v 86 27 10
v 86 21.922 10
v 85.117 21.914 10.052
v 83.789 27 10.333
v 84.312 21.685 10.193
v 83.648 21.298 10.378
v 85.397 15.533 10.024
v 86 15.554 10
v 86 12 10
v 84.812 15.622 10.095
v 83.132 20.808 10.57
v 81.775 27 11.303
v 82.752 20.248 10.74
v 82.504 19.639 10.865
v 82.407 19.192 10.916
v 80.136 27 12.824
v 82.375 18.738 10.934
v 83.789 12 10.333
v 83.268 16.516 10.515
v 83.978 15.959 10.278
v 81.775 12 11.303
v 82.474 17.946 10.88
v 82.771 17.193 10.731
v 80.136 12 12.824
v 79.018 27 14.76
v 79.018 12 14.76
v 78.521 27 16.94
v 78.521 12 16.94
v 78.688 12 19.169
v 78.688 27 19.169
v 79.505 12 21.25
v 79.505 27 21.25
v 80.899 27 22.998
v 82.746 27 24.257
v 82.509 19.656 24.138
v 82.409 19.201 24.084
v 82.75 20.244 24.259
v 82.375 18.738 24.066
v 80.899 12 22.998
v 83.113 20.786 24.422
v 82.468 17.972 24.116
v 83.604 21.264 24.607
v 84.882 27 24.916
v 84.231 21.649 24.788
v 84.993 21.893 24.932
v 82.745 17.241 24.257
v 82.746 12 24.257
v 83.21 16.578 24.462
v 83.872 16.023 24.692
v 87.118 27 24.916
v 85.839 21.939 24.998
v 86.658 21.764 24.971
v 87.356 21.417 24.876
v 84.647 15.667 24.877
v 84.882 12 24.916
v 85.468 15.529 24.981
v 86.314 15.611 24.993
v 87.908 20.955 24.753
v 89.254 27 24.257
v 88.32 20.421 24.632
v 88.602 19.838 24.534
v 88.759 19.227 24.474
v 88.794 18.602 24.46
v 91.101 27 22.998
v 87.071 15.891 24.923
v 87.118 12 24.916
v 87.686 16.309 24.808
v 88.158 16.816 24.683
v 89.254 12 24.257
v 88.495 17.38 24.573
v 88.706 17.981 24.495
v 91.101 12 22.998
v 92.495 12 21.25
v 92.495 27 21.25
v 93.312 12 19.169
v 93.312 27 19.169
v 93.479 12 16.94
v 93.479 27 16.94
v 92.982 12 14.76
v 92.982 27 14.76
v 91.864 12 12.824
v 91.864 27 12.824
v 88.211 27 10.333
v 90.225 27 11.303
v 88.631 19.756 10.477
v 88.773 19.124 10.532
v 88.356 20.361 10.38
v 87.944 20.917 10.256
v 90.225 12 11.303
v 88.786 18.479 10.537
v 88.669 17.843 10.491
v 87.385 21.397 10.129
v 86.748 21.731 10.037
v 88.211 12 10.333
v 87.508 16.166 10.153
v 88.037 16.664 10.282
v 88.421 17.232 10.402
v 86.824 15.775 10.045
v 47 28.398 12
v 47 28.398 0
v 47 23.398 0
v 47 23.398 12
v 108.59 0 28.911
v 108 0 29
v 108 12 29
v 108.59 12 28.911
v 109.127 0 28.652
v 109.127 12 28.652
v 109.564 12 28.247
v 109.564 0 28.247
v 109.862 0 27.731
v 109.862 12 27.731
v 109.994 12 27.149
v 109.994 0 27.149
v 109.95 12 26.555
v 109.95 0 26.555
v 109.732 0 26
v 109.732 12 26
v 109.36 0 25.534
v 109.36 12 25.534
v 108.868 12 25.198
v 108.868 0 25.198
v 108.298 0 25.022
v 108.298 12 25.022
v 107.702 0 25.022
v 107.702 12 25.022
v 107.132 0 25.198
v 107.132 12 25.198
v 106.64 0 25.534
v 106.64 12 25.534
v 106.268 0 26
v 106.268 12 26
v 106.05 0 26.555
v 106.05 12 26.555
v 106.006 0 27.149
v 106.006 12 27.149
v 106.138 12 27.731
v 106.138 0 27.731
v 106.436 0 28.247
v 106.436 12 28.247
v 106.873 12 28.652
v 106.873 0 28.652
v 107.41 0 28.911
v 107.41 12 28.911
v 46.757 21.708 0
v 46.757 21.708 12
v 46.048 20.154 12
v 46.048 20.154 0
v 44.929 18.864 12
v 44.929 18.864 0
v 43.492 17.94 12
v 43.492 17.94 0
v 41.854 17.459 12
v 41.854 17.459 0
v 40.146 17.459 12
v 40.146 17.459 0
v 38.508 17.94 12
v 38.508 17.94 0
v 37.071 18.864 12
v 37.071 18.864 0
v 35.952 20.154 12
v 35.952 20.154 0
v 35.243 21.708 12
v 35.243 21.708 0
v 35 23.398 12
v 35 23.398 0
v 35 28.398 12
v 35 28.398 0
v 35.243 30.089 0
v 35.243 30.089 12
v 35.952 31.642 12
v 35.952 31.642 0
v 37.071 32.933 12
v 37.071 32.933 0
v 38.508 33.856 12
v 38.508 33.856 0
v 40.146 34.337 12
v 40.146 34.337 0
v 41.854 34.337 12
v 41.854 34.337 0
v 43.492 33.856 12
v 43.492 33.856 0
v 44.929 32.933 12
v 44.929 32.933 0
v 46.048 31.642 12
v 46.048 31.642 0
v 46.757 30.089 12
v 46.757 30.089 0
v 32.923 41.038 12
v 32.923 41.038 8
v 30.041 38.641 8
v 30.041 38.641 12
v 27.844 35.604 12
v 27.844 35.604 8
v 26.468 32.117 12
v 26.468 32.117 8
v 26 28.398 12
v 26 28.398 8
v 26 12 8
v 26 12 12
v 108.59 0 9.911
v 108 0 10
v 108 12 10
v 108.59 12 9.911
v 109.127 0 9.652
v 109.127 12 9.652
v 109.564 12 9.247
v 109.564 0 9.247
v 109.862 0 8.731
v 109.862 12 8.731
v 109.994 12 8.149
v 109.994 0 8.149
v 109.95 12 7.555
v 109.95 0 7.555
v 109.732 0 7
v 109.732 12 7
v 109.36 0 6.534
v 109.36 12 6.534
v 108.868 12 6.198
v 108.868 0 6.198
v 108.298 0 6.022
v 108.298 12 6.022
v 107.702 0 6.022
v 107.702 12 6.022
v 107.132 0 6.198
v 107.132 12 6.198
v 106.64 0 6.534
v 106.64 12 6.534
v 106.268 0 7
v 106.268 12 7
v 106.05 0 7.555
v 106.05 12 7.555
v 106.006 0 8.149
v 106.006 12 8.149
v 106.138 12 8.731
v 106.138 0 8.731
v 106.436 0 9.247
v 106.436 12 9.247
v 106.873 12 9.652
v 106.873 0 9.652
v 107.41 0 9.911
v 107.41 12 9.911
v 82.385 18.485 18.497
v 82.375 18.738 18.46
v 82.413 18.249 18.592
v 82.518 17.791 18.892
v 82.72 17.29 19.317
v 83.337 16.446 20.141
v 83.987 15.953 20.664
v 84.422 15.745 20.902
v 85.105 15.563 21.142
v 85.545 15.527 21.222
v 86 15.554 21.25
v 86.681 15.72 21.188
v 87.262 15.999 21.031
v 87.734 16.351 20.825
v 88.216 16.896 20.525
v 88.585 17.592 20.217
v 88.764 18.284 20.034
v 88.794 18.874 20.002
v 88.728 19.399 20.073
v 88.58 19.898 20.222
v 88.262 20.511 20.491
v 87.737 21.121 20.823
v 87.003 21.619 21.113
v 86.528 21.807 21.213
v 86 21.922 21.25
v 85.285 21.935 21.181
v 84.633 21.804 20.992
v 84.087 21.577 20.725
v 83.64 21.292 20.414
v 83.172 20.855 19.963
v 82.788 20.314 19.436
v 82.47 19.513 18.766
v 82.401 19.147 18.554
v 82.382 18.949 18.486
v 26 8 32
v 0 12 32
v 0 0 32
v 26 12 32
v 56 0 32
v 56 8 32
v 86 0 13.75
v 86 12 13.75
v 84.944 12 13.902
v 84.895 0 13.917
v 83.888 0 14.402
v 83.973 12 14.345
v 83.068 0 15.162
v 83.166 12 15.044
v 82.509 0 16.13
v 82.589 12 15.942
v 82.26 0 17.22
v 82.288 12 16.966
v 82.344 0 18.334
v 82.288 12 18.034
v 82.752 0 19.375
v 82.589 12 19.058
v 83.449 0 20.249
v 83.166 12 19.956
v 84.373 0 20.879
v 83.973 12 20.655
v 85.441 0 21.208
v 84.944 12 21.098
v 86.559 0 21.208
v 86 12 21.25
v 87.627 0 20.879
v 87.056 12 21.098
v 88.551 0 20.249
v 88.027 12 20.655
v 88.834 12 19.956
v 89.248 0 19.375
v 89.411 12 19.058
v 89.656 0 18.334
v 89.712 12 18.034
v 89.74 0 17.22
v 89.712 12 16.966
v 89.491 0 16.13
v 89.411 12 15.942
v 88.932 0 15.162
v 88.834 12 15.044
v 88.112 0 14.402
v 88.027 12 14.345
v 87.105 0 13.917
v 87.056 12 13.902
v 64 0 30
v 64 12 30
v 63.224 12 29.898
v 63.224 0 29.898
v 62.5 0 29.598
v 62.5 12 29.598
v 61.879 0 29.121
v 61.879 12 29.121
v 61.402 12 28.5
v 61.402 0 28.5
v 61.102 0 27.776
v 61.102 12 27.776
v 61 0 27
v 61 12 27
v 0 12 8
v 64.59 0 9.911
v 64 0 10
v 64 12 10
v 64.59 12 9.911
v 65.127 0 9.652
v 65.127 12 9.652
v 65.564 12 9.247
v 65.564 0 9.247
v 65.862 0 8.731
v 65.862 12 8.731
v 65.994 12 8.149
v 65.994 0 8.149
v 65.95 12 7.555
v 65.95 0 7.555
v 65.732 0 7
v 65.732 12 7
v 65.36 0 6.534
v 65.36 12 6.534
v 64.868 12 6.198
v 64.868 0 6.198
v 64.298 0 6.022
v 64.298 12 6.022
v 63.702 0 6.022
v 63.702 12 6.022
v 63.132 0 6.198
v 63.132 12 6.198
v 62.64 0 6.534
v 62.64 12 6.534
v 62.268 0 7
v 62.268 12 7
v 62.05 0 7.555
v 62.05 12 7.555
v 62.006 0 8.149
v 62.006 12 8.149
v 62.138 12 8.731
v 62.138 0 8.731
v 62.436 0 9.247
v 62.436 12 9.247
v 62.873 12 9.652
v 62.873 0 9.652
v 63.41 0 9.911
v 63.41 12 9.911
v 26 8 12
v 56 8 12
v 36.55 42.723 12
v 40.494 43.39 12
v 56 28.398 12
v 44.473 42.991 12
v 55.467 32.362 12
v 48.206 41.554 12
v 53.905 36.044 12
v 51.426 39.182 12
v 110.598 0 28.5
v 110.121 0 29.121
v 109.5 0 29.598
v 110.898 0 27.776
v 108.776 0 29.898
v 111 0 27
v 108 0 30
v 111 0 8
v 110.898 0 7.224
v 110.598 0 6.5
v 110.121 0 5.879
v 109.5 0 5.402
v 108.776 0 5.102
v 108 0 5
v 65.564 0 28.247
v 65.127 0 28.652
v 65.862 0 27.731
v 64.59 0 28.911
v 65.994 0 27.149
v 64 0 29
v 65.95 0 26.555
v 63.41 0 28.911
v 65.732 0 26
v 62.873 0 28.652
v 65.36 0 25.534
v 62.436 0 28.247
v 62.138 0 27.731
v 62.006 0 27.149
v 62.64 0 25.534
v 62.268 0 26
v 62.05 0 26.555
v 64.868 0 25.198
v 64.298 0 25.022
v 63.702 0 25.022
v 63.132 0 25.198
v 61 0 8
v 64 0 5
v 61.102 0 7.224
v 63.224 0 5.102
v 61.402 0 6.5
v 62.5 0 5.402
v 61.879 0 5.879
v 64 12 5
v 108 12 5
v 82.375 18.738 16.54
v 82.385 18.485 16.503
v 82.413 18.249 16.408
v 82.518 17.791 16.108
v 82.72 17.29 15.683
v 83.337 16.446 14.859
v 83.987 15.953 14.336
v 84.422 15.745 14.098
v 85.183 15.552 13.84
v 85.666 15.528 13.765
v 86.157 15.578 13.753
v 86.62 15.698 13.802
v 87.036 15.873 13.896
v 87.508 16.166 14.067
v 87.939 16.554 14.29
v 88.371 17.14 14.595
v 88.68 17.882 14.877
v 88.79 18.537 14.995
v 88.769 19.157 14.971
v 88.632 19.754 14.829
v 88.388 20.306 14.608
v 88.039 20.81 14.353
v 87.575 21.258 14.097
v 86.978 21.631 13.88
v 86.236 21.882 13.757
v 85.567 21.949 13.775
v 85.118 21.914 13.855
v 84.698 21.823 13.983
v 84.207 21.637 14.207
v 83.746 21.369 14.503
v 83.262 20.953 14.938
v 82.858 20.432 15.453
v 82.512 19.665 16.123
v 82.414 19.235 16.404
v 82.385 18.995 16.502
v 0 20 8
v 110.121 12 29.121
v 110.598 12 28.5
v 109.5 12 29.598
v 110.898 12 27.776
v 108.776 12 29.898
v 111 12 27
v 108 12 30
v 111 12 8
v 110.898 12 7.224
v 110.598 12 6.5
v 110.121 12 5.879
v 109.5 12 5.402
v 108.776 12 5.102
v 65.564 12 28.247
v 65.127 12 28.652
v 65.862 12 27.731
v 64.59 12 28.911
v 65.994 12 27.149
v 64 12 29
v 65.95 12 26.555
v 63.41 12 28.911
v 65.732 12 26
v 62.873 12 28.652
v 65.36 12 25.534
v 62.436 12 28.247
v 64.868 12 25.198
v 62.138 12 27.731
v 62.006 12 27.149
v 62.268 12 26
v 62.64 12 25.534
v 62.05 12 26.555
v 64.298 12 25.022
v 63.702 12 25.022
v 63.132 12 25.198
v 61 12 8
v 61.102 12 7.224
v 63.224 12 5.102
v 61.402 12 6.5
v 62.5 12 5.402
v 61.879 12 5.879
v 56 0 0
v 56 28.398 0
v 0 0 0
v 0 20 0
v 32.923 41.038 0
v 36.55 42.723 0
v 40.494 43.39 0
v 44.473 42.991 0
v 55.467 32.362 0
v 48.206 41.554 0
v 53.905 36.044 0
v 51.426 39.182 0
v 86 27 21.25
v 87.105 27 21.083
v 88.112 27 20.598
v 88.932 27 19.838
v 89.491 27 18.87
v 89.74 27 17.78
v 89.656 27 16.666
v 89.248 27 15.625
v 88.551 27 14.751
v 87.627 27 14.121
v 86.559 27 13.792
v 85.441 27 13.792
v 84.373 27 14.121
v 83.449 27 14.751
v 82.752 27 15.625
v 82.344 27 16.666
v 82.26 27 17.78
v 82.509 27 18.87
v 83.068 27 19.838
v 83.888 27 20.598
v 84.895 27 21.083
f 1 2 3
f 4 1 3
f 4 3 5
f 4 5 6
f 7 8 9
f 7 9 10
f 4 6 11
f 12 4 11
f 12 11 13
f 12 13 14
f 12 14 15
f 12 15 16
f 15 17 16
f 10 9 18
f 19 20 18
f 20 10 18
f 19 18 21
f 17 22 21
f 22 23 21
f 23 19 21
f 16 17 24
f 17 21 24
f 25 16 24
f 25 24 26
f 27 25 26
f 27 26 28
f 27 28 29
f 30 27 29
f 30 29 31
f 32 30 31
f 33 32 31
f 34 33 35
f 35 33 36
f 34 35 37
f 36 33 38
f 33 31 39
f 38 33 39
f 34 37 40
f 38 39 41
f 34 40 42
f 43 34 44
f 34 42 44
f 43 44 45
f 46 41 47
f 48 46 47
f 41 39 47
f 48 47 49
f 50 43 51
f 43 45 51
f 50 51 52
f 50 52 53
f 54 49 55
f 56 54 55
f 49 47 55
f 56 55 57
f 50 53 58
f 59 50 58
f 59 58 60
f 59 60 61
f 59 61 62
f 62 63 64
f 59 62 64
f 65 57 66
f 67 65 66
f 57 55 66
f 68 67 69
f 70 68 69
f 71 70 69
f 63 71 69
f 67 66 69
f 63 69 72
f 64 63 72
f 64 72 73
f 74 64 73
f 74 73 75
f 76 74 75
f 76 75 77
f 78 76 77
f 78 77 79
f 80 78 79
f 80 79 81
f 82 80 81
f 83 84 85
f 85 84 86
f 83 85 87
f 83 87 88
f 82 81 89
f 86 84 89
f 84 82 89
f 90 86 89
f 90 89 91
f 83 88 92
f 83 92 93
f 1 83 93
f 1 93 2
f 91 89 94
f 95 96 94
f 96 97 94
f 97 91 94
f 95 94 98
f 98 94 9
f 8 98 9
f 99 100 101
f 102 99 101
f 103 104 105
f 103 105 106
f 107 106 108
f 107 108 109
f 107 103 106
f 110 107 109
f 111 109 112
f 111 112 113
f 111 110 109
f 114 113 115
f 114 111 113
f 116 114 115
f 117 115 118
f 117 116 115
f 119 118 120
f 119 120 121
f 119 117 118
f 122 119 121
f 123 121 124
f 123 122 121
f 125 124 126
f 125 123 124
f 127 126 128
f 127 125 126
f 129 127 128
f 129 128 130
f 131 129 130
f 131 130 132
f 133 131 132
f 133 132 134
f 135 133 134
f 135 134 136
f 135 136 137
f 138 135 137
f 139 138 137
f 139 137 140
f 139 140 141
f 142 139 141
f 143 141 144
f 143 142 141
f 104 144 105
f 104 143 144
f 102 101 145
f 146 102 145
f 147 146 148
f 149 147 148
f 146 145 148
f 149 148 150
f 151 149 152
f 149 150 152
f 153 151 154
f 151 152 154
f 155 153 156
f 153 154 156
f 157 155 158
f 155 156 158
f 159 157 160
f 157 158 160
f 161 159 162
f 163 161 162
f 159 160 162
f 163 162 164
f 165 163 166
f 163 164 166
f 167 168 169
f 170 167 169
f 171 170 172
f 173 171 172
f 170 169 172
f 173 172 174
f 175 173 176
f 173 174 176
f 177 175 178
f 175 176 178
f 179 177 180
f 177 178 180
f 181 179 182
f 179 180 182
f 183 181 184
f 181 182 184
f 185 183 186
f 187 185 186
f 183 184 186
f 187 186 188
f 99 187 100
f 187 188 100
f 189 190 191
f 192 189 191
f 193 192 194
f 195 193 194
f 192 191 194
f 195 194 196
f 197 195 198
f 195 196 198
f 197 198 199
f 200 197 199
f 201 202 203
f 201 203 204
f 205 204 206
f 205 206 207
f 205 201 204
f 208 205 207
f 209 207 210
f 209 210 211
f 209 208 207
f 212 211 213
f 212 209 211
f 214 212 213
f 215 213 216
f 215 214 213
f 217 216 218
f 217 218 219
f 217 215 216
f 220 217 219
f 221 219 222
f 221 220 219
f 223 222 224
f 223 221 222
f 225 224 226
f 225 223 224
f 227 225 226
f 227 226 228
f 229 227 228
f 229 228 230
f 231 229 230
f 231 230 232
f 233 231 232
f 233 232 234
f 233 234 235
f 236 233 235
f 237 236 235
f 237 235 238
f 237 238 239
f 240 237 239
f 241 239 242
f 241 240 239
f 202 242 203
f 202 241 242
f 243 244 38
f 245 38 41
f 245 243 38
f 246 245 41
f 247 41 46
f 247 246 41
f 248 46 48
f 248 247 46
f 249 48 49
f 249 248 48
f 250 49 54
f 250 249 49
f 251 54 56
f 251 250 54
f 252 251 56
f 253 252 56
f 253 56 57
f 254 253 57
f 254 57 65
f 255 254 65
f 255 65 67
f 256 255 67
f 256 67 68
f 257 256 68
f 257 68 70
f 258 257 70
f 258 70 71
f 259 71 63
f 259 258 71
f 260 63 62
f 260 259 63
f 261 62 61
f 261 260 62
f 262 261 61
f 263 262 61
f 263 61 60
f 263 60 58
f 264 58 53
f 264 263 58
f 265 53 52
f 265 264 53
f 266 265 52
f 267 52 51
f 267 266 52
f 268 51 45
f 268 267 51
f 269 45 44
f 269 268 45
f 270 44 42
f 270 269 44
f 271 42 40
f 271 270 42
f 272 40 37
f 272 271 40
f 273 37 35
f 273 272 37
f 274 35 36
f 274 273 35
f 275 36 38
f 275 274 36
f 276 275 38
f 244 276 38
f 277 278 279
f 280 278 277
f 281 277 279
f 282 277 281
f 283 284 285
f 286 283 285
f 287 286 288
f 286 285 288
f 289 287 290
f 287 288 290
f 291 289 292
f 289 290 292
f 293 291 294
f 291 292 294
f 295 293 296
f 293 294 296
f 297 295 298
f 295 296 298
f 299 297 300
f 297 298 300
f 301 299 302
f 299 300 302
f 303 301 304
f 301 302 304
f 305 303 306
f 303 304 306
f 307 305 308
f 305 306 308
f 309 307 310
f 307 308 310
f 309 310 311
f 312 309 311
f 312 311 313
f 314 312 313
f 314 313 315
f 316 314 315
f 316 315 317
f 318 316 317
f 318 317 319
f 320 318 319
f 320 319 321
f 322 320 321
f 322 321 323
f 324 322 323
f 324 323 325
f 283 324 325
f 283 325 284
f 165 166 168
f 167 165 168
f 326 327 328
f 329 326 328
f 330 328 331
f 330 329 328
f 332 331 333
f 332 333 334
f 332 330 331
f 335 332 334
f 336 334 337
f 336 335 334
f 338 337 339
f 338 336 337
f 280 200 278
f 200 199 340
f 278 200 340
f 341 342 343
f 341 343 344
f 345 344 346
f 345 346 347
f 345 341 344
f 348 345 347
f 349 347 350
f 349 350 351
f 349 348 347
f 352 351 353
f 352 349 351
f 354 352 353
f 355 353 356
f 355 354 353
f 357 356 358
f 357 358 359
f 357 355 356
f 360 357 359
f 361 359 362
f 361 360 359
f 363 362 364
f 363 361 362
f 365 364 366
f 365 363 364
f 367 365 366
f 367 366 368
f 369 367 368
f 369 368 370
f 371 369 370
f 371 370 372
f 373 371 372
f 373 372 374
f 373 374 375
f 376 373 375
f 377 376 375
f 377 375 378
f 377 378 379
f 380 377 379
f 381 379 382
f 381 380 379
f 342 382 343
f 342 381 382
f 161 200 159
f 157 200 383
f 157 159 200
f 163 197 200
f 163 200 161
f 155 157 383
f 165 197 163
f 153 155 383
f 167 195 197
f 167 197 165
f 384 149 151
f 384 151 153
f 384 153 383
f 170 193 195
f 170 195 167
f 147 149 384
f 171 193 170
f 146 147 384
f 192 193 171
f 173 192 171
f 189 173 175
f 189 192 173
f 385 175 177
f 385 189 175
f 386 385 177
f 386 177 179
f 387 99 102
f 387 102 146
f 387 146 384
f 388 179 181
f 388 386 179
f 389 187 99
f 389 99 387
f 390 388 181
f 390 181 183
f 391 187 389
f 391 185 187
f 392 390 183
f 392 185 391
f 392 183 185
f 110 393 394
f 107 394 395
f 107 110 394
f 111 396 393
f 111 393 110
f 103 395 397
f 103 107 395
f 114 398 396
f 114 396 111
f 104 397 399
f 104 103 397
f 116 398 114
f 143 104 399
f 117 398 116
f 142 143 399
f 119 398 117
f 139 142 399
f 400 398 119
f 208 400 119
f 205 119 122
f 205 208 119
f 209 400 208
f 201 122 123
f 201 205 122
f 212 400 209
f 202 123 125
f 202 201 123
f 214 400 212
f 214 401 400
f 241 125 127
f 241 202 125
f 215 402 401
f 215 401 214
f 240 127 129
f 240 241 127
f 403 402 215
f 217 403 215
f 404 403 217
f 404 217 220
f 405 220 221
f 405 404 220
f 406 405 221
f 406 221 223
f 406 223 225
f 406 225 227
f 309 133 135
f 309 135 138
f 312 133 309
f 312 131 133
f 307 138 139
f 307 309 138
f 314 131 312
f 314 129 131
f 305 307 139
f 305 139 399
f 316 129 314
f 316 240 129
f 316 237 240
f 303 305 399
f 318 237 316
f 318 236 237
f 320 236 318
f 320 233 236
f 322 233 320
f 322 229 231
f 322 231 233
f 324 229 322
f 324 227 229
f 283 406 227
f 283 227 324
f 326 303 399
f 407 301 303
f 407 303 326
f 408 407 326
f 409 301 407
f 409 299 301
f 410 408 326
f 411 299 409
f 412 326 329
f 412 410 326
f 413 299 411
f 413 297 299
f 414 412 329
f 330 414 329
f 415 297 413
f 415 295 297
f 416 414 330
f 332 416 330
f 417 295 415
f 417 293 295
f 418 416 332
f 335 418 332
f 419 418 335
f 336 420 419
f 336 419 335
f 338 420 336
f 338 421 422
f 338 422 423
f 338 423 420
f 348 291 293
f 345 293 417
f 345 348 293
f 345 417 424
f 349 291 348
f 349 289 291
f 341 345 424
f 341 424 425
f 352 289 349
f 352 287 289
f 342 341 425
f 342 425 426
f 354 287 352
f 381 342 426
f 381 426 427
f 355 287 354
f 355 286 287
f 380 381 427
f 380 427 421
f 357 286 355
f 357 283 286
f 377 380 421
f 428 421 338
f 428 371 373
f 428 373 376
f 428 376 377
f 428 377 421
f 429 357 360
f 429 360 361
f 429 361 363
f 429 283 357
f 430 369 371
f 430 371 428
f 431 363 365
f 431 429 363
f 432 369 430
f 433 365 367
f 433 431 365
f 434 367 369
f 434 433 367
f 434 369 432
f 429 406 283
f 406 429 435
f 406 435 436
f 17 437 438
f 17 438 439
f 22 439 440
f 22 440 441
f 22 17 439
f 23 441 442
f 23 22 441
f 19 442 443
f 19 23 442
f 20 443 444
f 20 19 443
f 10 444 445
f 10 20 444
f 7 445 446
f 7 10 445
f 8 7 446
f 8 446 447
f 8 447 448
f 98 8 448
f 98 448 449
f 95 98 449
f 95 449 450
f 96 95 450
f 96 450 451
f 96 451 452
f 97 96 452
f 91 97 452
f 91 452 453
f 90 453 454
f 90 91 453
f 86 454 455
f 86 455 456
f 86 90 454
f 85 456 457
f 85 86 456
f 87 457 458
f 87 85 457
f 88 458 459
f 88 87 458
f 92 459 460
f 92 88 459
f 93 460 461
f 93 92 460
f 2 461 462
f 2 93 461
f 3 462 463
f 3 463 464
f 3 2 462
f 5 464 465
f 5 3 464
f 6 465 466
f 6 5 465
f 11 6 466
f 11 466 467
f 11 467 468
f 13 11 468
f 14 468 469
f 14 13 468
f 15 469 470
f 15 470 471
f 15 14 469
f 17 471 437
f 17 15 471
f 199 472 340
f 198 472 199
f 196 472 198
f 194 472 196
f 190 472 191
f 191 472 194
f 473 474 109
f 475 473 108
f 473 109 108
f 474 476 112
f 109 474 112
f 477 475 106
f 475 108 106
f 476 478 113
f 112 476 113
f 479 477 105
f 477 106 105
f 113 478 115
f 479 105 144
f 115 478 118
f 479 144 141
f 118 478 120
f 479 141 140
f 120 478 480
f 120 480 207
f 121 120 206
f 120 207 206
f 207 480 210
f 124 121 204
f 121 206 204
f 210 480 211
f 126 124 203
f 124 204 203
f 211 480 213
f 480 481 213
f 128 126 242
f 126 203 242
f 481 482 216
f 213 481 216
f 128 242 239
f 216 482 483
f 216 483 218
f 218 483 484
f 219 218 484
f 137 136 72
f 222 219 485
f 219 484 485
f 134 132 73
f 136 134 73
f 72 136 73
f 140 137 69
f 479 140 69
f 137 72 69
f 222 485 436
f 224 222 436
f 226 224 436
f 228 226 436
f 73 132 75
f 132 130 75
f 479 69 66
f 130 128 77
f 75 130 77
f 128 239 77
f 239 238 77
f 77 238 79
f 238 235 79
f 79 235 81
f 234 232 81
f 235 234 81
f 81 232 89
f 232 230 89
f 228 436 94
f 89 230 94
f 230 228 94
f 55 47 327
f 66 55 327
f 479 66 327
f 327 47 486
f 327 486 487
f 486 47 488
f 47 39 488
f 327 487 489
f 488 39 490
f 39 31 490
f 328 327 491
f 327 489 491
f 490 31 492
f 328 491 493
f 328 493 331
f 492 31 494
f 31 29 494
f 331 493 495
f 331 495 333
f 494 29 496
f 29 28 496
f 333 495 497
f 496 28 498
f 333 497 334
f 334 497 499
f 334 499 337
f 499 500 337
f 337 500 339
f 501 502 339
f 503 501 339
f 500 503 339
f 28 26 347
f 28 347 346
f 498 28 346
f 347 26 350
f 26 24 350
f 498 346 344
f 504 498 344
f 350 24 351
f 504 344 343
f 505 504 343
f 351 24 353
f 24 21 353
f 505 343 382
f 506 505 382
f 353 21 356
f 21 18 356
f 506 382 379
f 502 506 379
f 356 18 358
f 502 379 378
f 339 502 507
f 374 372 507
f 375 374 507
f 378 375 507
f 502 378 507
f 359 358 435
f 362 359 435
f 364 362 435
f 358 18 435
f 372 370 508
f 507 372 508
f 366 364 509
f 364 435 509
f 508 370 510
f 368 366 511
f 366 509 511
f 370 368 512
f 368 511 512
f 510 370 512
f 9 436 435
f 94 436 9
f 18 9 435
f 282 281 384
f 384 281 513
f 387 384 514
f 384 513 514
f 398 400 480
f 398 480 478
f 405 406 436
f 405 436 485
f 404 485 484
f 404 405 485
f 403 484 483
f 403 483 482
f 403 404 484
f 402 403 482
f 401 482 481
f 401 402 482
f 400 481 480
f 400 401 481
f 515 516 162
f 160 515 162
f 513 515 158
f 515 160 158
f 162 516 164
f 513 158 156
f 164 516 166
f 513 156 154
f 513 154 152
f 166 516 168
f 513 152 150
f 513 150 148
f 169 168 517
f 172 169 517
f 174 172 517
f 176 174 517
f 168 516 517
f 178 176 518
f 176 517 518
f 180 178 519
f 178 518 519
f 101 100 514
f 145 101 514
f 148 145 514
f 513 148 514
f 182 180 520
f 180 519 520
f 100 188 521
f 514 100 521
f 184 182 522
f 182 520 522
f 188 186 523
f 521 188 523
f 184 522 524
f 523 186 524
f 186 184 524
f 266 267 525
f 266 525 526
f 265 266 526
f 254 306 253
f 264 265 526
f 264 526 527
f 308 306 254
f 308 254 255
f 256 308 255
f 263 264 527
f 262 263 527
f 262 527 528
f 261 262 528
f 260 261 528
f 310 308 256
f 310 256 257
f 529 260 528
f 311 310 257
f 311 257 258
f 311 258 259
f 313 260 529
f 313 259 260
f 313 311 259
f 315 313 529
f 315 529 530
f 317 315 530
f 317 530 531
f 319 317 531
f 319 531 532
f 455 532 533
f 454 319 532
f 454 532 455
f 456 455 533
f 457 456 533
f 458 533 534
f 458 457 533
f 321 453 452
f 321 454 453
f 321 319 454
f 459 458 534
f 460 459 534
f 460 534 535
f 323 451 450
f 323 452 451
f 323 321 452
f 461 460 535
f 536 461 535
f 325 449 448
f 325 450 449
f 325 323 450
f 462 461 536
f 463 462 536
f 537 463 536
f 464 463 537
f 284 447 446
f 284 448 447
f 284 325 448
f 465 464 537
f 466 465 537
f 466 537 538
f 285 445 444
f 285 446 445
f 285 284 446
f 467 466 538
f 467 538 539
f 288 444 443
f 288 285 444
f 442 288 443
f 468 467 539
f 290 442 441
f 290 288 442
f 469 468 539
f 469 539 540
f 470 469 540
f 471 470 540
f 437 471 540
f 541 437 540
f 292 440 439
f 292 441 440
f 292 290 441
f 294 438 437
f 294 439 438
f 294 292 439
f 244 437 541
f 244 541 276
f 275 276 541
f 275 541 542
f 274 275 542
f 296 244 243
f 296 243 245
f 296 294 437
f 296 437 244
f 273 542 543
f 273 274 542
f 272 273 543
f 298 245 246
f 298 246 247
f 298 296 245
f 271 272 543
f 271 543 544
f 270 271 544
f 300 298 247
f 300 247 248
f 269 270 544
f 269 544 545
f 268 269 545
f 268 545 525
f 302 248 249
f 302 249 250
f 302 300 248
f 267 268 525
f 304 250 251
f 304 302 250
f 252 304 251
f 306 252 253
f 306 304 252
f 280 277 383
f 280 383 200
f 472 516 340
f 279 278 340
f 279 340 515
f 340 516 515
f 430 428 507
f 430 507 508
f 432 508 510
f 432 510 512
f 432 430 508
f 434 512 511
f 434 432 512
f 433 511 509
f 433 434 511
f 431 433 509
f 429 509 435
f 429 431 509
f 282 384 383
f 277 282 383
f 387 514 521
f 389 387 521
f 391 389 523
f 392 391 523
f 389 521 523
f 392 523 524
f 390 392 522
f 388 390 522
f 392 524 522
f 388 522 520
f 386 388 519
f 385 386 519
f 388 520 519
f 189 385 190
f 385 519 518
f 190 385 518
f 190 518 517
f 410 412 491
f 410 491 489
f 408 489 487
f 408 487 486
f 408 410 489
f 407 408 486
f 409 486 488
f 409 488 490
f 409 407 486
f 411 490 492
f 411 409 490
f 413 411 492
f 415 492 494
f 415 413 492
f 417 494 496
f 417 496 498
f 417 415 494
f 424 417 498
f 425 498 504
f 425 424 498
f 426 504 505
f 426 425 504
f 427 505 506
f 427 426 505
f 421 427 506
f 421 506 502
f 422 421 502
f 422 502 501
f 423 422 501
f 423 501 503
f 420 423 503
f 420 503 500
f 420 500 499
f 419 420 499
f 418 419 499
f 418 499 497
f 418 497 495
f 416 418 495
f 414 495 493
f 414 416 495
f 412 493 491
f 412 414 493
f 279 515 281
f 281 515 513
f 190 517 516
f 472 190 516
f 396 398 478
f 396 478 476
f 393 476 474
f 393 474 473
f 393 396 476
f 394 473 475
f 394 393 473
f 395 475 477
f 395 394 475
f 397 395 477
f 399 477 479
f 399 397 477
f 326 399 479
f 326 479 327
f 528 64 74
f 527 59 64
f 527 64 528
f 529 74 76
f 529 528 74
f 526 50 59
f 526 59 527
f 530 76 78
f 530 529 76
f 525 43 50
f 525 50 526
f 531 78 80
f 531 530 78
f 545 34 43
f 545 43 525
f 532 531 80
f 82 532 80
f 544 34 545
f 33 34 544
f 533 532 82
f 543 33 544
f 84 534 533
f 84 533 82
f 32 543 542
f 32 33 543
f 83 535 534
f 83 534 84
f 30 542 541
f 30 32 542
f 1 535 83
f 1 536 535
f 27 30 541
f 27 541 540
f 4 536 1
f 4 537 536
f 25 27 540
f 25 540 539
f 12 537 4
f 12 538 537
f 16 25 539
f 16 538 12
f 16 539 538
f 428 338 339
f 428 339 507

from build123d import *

# Parameters (mm, degrees)
EXTRUDE_1_DEPTH          = 32
EXTRUDE_2_DEPTH          = 8
EXTRUDE_3_DEPTH          = 12
SKETCH_2_R               = 2
EXTRUDE_4_DEPTH          = 12
SKETCH_3_R               = 7.5
SKETCH_3_R_2             = 3.75
EXTRUDE_5_DEPTH          = 15
SKETCH_3_5_R             = 3.75
CUT_EXTRUDE_2_DEPTH      = 15
CUT_EXTRUDE_3_DEPTH      = 15
CUT_EXTRUDE_3_DEPTH_BACK = 15
SKETCH_7_R               = 3.210770443


with BuildPart() as part:
    # 草图1 → 凸台-拉伸1 (new body)
    with BuildSketch(Plane.XY):
        Polygon((0, 12), (0, 0), (56, 0), (56, 8), (26, 8), (26, 12), align=None)
    extrude(amount=EXTRUDE_1_DEPTH)

    # 草图1<3> → 凸台-拉伸2 (add)
    with BuildSketch(Plane.XY):
        with BuildLine():
            Line((0, 20), (0, 12))
            Line((0, 12), (26, 12))
            Line((26, 12), (26, 28.398213008))
            ThreePointArc((26, 28.398213008), (27.844145216, 35.604008238), (32.923131319, 41.037999094))
            Line((32.923131319, 41.037999094), (0, 20))
        make_face()
    extrude(amount=EXTRUDE_2_DEPTH)

    # 草图1<4> → 凸台-拉伸3 (add)
    with BuildSketch(Plane.XY):
        with BuildLine():
            Line((26, 8), (56, 8))
            Line((56, 8), (56, 28.398213008))
            ThreePointArc((56, 28.398213008), (48.20579523, 41.554067792), (32.923131319, 41.037999094))
            ThreePointArc((32.923131319, 41.037999094), (27.844145216, 35.604008238), (26, 28.398213008))
            Line((26, 28.398213008), (26, 12))
            Line((26, 12), (26, 8))
        make_face()
        with BuildLine():
            ThreePointArc((35, 28.398213008), (41, 34.398213008), (47, 28.398213008))
            Line((47, 28.398213008), (47, 23.398213008))
            ThreePointArc((47, 23.398213008), (41, 17.398213008), (35, 23.398213008))
            Line((35, 23.398213008), (35, 28.398213008))
        make_face(mode=Mode.SUBTRACT)
    extrude(amount=EXTRUDE_3_DEPTH)


with BuildPart() as body_2:
    # 草图2 → 凸台-拉伸4 (new body)
    with BuildSketch(Plane(origin=(0, 0, 0), x_dir=(1, 0, 0), z_dir=(0, 1, 0))):
        with BuildLine():
            Line((64, -5), (108, -5))
            ThreePointArc((108, -5), (110.121320344, -5.878679656), (111, -8))
            Line((111, -8), (111, -27))
            ThreePointArc((111, -27), (110.121320344, -29.121320344), (108, -30))
            Line((108, -30), (64, -30))
            ThreePointArc((64, -30), (61.878679656, -29.121320344), (61, -27))
            Line((61, -27), (61, -8))
            ThreePointArc((61, -8), (61.878679656, -5.878679656), (64, -5))
        make_face()
        with Locations((64, -8)):
            Circle(SKETCH_2_R, mode=Mode.SUBTRACT)
        with Locations((64, -27)):
            Circle(SKETCH_2_R, mode=Mode.SUBTRACT)
        with Locations((108, -8)):
            Circle(SKETCH_2_R, mode=Mode.SUBTRACT)
        with Locations((108, -27)):
            Circle(SKETCH_2_R, mode=Mode.SUBTRACT)
    extrude(amount=EXTRUDE_4_DEPTH)

    # 草图3 → 凸台-拉伸5 (add)
    with BuildSketch(Plane(origin=(0, 12, 0), x_dir=(1, 0, 0), z_dir=(0, 1, 0))):
        with Locations((86, -17.5)):
            Circle(SKETCH_3_R)
        with Locations((86, -17.5)):
            Circle(SKETCH_3_R_2, mode=Mode.SUBTRACT)
    extrude(amount=EXTRUDE_5_DEPTH)

    # 草图3<5> → 切除-拉伸2 (cut)
    with BuildSketch(Plane(origin=(0, 12, 0), x_dir=(1, 0, 0), z_dir=(0, 1, 0))):
        with Locations((86, -17.5)):
            Circle(SKETCH_3_5_R)
    extrude(amount=-CUT_EXTRUDE_2_DEPTH, mode=Mode.SUBTRACT)

    # 草图7 → 切除-拉伸3 (cut, two sides: drawn at the far end of the back side and taken through both)
    with BuildSketch(Plane.XY.offset(17.5).offset(-CUT_EXTRUDE_3_DEPTH_BACK)):
        with Locations((85.585808846, 18.737897238)):
            Circle(SKETCH_7_R)
    extrude(amount=CUT_EXTRUDE_3_DEPTH + CUT_EXTRUDE_3_DEPTH_BACK, mode=Mode.SUBTRACT)


solid = Compound([part.part, body_2.part])
